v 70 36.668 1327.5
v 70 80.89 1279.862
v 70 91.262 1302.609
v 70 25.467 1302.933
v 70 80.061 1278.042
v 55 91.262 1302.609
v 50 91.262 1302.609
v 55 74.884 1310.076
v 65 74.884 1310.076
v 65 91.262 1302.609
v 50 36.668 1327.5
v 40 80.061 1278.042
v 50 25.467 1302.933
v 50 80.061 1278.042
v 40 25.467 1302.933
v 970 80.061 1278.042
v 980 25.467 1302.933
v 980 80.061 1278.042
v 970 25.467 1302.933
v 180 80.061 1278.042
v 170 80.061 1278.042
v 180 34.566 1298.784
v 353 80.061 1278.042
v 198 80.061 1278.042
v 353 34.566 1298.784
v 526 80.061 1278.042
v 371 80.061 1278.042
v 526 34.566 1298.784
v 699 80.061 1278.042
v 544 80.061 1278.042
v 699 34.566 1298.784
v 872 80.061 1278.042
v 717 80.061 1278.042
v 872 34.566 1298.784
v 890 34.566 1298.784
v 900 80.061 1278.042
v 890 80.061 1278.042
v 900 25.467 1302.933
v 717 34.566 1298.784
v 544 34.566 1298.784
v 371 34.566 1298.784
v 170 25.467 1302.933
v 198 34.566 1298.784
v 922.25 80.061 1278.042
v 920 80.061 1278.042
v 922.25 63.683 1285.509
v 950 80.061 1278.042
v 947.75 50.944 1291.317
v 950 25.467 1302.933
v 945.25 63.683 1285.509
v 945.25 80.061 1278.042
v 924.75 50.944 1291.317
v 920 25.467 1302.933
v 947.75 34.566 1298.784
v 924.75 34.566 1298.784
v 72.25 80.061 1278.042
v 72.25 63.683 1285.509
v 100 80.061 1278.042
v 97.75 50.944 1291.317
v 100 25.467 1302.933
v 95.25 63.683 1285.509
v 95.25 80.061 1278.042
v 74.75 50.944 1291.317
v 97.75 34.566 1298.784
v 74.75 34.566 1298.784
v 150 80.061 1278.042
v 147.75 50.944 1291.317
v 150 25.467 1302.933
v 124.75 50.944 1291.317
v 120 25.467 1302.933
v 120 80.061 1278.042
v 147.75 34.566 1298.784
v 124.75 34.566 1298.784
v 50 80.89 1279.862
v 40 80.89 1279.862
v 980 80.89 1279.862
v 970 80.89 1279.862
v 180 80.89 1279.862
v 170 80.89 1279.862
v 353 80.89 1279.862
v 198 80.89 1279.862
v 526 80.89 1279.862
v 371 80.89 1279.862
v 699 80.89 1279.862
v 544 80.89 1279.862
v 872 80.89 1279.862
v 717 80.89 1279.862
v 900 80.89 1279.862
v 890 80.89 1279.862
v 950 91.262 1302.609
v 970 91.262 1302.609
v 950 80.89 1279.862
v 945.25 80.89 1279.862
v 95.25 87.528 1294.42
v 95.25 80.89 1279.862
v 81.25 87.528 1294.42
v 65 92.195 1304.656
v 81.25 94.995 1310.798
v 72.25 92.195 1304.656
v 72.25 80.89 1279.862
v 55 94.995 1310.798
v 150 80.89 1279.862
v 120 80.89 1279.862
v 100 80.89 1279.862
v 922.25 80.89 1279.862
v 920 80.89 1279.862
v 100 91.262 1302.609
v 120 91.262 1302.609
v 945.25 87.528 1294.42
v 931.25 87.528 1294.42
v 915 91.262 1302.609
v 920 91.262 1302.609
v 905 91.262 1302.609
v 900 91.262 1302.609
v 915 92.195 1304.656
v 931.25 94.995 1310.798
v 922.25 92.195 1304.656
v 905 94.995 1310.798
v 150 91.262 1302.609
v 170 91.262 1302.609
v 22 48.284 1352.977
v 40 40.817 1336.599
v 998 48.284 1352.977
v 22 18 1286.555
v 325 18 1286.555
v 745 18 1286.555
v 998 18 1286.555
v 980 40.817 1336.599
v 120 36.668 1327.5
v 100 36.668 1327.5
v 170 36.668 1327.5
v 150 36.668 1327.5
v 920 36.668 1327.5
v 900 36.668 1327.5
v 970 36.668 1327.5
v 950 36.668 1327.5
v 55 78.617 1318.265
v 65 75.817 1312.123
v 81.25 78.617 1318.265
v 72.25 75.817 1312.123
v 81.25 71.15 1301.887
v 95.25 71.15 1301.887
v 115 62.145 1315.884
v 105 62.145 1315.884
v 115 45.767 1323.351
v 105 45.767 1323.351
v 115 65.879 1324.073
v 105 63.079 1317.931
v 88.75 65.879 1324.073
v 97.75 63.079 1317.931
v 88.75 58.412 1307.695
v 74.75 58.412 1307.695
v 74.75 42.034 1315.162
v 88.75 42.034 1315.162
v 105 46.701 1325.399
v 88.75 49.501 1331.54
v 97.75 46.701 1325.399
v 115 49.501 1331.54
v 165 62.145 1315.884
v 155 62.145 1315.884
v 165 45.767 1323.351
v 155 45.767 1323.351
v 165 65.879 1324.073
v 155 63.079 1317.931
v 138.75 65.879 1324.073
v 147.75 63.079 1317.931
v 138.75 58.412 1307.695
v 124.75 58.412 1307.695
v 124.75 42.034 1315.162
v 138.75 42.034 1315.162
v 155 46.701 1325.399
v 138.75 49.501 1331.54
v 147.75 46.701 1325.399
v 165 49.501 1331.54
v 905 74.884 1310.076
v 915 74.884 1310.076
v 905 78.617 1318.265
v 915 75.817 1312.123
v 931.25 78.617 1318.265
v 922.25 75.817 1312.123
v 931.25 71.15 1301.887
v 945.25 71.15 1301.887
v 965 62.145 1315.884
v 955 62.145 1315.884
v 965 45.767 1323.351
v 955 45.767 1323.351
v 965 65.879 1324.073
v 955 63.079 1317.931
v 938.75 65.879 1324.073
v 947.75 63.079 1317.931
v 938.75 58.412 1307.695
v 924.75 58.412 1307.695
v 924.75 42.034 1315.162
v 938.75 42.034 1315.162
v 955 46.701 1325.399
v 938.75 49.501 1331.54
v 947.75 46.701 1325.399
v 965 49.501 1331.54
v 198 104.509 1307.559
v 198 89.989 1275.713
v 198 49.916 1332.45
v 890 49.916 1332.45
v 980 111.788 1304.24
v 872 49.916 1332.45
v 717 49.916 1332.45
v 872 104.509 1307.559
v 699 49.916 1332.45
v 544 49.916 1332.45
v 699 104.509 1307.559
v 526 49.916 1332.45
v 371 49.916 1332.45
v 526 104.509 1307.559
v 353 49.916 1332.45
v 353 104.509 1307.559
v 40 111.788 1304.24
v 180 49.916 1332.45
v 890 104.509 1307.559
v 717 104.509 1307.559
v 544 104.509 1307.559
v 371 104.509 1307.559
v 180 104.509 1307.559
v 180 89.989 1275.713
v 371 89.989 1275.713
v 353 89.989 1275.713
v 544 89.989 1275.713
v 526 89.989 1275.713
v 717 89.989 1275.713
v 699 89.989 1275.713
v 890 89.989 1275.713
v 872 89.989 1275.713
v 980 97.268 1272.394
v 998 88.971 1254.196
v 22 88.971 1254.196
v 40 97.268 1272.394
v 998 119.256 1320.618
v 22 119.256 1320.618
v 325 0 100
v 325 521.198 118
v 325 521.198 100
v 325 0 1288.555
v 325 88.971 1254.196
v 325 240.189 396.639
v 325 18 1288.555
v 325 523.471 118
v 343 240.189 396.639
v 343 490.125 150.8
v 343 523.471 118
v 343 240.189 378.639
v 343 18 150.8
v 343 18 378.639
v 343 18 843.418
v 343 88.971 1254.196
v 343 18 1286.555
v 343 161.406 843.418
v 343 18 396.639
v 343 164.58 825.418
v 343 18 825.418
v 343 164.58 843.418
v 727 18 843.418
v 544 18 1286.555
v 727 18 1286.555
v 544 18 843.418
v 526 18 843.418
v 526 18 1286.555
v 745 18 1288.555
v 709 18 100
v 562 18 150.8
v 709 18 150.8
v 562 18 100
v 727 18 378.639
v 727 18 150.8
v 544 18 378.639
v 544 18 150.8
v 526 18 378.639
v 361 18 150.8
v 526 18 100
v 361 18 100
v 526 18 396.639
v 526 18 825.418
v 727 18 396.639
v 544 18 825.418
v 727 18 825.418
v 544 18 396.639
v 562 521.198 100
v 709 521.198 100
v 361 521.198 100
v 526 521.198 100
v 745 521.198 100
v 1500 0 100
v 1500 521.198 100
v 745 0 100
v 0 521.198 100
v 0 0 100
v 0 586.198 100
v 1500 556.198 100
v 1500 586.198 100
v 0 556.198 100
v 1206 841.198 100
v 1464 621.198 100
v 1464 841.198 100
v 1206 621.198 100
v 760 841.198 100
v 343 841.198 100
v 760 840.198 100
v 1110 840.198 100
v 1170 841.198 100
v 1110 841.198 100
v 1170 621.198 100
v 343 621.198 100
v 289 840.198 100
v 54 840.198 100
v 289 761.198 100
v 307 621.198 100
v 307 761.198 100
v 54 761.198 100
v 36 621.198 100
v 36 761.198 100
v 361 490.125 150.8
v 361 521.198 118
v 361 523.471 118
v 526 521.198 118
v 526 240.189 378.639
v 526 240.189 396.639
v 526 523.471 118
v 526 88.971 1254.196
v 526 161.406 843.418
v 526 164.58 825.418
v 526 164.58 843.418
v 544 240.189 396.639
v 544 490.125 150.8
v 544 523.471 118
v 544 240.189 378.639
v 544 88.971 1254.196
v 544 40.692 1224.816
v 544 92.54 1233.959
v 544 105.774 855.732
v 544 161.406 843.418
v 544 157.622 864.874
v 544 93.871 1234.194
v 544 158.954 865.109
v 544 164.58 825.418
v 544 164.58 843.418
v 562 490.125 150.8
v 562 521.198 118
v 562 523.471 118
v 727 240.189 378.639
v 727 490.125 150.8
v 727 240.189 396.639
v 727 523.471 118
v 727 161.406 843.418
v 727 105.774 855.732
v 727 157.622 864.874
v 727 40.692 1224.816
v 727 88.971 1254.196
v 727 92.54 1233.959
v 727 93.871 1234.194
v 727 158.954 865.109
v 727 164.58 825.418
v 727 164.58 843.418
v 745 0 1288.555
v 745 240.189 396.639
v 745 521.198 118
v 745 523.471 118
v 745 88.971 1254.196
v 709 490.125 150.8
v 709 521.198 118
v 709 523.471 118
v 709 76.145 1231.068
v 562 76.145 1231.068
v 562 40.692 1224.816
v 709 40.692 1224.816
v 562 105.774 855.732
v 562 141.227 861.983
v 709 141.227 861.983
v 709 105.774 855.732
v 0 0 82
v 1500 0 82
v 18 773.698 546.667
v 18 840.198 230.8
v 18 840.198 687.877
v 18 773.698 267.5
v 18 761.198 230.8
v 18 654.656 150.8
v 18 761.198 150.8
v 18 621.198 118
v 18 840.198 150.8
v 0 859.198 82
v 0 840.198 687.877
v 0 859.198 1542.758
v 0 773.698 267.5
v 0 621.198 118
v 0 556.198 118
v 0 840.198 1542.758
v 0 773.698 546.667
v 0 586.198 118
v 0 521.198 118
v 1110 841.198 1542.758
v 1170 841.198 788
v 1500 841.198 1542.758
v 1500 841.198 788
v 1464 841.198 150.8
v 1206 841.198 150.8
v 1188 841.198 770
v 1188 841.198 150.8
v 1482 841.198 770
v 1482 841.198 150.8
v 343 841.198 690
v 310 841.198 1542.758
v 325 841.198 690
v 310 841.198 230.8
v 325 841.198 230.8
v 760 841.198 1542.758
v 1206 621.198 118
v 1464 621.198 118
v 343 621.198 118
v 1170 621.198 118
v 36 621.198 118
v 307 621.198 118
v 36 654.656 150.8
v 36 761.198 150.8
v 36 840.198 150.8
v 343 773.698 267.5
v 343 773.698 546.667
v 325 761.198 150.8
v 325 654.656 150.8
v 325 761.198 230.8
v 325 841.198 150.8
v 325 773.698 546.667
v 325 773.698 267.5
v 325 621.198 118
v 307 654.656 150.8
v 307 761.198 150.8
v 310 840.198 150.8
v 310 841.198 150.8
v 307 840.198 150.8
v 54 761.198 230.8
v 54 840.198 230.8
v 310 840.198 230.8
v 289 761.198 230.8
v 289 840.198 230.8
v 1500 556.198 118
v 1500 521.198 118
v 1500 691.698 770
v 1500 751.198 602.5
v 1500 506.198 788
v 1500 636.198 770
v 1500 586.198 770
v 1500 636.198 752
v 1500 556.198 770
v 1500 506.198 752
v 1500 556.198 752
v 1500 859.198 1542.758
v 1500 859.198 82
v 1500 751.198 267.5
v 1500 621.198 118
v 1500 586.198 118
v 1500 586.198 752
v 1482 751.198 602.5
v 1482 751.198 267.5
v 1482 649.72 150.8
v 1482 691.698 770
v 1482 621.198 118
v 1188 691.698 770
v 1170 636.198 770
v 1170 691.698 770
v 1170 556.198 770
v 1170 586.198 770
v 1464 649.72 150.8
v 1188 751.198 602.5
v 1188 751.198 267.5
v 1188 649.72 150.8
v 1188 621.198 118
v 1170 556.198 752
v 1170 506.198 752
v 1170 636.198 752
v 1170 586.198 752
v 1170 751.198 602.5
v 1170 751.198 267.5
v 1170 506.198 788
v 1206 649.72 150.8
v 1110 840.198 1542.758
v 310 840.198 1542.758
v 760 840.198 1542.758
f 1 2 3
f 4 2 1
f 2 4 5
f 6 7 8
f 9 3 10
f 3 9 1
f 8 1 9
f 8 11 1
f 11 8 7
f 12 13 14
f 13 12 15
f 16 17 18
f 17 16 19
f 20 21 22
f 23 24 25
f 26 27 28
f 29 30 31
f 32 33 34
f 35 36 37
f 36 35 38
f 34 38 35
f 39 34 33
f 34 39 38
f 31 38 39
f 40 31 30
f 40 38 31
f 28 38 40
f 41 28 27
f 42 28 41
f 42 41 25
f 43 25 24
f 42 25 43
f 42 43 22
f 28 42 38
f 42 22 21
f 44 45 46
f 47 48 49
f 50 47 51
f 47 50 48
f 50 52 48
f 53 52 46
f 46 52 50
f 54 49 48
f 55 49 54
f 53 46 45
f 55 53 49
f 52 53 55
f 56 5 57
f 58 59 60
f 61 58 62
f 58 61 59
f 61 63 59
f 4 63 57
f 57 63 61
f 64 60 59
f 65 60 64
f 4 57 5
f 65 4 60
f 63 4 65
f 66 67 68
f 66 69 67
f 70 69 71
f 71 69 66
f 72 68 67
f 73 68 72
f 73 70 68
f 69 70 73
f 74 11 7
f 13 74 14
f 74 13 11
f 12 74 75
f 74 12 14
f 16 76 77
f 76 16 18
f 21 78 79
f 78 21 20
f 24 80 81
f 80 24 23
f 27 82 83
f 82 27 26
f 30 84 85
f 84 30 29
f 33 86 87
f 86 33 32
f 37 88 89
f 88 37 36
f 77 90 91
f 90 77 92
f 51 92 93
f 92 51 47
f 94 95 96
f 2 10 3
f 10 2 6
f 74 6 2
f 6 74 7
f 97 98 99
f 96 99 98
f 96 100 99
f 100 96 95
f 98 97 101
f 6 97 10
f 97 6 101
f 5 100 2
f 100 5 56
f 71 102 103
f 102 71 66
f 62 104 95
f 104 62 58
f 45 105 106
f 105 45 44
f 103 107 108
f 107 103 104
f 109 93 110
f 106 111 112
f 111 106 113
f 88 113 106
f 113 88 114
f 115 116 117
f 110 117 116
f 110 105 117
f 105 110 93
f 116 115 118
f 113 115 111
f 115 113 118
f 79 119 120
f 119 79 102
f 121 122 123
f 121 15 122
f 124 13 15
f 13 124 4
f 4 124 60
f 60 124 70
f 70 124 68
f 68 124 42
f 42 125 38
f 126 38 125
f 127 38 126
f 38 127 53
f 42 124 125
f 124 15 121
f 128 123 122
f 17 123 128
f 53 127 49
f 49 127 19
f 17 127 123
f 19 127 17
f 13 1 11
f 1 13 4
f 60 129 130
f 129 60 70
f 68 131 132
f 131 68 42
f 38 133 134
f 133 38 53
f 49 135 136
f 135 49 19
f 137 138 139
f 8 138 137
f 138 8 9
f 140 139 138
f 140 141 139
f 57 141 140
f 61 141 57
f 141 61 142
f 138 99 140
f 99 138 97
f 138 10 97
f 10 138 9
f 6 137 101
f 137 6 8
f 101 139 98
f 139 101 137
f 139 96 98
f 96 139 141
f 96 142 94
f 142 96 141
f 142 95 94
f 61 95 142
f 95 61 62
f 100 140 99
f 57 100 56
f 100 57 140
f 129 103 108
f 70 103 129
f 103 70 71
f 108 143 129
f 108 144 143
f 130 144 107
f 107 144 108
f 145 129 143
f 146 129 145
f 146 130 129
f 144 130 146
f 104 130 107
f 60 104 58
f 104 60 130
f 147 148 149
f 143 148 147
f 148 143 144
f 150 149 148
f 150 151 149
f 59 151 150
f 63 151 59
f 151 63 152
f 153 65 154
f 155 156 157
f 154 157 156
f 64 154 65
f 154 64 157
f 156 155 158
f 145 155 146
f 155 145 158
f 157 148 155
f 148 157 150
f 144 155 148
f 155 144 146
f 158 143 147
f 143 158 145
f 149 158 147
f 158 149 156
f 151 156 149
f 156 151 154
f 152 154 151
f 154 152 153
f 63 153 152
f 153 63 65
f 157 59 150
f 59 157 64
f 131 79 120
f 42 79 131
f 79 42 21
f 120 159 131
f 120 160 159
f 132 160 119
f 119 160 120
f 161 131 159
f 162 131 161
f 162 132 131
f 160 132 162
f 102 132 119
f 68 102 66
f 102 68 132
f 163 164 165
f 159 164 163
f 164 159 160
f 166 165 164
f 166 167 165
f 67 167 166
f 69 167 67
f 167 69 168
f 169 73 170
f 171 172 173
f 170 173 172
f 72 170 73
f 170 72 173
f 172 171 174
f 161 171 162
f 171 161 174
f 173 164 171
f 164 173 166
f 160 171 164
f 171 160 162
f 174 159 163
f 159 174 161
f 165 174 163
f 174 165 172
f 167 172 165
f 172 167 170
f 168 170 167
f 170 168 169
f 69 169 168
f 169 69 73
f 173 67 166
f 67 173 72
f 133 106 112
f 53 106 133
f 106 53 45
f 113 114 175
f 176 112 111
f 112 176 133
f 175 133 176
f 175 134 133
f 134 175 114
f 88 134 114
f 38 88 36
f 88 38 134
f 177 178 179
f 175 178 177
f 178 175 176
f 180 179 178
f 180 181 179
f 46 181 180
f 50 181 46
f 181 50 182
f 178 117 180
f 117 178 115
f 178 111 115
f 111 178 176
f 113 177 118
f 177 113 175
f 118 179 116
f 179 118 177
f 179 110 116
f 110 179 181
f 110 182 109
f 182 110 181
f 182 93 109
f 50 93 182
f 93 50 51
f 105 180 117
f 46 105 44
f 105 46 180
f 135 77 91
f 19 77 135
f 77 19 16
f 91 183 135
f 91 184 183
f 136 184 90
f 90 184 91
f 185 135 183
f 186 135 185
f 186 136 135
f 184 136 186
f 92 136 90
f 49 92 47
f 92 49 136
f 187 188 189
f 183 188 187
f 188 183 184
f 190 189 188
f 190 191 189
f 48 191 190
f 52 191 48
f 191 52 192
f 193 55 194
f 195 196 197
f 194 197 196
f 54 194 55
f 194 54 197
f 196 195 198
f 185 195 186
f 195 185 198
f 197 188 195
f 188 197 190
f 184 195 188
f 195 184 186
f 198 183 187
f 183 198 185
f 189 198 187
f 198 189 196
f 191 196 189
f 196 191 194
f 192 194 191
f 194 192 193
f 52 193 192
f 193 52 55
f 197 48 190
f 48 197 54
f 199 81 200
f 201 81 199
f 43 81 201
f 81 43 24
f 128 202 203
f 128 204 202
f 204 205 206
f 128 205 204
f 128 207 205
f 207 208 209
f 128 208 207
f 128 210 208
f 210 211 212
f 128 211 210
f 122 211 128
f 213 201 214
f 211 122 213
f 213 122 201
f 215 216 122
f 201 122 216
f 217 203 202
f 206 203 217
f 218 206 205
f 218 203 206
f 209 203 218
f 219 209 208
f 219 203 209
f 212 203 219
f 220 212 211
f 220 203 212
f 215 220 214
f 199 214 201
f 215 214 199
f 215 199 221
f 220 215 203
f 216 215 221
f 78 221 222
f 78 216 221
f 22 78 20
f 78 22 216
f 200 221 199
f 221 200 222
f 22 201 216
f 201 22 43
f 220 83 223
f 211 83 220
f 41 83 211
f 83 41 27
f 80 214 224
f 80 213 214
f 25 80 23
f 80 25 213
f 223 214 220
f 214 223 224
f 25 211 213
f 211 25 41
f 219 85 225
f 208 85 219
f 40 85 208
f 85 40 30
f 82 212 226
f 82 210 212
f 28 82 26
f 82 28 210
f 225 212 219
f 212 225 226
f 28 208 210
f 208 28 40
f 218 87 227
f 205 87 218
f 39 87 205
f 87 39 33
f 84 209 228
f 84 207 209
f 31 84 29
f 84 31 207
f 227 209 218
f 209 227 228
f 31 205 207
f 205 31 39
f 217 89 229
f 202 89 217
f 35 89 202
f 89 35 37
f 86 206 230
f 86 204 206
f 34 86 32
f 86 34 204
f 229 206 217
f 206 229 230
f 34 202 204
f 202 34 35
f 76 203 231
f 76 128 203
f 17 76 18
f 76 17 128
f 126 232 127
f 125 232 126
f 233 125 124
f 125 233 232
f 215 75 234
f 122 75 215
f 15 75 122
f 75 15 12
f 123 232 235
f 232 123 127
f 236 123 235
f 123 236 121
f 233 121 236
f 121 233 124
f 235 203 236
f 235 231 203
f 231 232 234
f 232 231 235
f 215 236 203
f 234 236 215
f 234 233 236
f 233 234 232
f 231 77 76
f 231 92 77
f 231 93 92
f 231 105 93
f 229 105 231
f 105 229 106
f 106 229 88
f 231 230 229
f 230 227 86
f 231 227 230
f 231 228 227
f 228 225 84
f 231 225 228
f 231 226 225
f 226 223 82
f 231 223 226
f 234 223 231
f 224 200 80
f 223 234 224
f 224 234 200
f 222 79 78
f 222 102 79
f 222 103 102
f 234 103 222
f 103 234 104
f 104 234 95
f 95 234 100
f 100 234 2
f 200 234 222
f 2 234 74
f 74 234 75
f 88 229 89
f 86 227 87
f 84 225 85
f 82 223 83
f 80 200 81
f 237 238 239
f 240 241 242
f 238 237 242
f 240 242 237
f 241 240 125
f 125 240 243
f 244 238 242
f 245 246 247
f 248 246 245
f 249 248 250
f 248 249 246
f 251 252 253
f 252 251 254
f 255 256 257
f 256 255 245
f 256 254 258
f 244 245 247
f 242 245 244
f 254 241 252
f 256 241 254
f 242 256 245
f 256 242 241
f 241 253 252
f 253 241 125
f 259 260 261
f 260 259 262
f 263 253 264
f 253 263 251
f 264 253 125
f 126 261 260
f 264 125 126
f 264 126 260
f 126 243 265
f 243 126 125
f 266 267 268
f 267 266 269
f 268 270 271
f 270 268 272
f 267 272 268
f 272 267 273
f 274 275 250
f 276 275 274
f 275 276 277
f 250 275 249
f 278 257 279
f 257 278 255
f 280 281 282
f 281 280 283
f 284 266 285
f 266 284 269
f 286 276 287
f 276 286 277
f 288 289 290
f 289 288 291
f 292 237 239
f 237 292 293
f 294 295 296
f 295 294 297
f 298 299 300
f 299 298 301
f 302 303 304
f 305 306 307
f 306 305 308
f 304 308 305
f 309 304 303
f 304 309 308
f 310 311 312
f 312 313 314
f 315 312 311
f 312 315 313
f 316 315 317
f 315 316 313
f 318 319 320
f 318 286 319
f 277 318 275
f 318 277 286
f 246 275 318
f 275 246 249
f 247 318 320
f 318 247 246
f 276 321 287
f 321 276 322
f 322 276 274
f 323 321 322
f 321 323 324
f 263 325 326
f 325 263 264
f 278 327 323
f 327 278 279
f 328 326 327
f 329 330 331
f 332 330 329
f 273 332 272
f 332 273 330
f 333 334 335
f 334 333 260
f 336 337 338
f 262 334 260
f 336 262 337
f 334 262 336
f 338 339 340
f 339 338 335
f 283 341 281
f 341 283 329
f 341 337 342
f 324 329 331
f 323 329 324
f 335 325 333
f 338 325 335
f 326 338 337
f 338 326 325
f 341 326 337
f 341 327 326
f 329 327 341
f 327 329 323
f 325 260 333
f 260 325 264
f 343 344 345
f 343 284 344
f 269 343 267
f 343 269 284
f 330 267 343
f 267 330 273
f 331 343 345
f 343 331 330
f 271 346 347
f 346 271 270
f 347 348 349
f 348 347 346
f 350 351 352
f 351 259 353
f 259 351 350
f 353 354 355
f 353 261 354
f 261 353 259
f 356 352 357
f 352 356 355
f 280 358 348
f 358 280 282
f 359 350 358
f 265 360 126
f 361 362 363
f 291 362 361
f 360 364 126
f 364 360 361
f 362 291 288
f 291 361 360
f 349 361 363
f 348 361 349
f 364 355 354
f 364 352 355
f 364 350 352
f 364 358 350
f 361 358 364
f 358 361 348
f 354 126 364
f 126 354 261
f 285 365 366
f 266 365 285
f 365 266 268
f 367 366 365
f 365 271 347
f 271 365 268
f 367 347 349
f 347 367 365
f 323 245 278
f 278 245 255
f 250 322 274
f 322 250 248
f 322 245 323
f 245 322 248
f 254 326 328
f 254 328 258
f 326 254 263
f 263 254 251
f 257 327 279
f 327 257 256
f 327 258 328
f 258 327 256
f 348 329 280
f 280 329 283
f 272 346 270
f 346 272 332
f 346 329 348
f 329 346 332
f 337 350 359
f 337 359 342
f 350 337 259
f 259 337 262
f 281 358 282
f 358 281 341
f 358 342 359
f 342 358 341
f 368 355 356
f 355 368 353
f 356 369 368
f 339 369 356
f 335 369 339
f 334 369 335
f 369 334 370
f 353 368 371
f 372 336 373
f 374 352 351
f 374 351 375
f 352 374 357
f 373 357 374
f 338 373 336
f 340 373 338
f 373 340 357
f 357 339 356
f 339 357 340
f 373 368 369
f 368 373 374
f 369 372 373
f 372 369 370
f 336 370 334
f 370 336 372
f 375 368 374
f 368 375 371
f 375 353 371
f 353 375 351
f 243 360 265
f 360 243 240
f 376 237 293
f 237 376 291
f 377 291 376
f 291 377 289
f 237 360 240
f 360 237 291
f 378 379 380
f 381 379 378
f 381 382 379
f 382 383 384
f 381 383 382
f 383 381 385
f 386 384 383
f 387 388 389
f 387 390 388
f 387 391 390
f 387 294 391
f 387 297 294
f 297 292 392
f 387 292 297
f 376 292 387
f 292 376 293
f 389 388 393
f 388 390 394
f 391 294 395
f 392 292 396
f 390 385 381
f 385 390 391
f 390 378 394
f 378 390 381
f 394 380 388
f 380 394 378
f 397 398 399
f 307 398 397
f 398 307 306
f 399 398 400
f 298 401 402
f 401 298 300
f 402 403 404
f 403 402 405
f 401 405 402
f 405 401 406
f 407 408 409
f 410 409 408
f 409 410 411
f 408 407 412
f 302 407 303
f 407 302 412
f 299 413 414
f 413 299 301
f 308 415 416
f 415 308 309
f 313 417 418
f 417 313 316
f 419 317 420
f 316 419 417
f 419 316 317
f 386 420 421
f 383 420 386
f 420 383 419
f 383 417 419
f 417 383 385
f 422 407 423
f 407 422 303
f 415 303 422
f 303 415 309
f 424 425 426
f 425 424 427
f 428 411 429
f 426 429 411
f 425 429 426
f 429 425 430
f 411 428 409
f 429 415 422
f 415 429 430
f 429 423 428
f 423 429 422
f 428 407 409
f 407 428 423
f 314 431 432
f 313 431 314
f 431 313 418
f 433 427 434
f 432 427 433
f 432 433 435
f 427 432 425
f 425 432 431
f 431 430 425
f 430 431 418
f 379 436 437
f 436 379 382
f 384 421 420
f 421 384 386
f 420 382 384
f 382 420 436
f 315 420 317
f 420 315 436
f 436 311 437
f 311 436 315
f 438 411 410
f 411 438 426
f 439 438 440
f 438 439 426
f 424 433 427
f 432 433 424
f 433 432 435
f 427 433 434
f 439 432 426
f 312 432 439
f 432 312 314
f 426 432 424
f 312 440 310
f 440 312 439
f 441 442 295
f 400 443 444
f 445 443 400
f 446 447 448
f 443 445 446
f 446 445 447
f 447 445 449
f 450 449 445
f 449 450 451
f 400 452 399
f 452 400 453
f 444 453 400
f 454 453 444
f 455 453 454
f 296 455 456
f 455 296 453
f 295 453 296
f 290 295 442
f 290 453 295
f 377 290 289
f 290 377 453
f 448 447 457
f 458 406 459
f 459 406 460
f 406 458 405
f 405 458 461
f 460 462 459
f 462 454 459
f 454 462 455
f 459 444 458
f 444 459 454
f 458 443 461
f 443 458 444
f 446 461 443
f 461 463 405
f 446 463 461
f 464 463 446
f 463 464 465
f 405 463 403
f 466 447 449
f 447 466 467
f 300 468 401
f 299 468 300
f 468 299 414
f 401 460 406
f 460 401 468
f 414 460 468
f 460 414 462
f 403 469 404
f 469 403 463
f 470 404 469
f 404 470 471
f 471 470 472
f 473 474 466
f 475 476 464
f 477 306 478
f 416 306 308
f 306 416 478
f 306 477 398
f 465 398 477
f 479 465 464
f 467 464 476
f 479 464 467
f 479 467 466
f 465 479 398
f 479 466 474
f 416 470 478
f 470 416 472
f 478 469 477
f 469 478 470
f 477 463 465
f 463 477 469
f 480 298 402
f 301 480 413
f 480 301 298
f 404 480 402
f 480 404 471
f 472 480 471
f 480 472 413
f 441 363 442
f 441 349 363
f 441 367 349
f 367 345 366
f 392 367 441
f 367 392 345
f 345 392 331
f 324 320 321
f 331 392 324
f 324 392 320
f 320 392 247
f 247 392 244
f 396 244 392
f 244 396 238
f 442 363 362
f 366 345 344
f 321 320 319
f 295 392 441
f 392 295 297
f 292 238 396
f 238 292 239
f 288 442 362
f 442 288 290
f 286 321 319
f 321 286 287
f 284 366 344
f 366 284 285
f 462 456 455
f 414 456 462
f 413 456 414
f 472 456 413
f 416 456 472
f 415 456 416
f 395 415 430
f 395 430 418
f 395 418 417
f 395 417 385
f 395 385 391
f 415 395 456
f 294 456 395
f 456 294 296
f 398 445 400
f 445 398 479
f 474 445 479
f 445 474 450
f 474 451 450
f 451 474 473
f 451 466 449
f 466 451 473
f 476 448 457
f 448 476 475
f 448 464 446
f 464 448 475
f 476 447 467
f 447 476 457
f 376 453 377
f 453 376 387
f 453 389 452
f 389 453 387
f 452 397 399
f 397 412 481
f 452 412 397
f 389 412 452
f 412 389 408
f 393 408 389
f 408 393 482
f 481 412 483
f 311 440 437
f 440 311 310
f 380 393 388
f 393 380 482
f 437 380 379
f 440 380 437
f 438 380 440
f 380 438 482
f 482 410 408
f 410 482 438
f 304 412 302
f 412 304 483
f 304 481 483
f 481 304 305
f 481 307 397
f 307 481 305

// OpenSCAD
// file: params.scad
sheet_thickness=18;				// thickness of the plywood sheet.

laser_width=20;					// width of the laser
laser_height=27;				// height of the laser
laser_origin_height=16;			// center of the laser beam
laser_length=60;				// length of the laser (includes cable allowance).
laser_spread_angle = 2*atan((110/2)/60);	// angle the laser spreads out from origin.

laser_setback        =  48.45*10;	// how much the laser is set back from the center of the bike.
laser_position_z     = 119.26*10;	// height of the laser center.
laser_position_angle =  24.51;		// angle the laser points down.

laser_low = 50;
laser_high=1350;

laser_y = laser_length;

wheel_width=30;					// maximum width of a wheel
wheel_height=670;				// height of a 700CC wheel.

handlebar_width_max = 500;
channel_offset = handlebar_width_max / 2 + 20;
channel_thickness = 50;

base_length=1500;

hb_85=50+laser_width/2;			// position of handlebar 85cm line (centered on laser)
hb_80=hb_85+50;					// position of handlebar 80cm line
hb_75=hb_80+50;					// position of handlebar 75cm line

bb_0=hb_75+750;					// position of bottom bracket line
bb_5=bb_0+50;					// position of bottom bracket +5cm line

// castor dimensions.
castor_height = 82;
castor_radius = 80;
castor_plate = 36;

// bottom of the jig from the floor.
base_bottom = sheet_thickness + castor_height;

tab_height = 2*25.4;	// Height of the tabs to attach the column and back.

// utility functions.

function rotate_point(p,a) = [p[0]*cos(a) - p[1]*sin(a), p[0]*sin(a) + p[1]*cos(a)];

// output the sheet thickness so export.py knows how to created the files.
echo( sheet_thickness=sheet_thickness );
// file: lasers.scad
include <params.scad>

show_laser_lines = 0;

laser_clearance = 10;   // Clearance around the laser modules.
lasers_x = hb_85-laser_width/2-laser_clearance-sheet_thickness;
lasers_margin = laser_width/2+laser_clearance+sheet_thickness;
lasers_length = (bb_5-hb_85)+2*lasers_margin;
lasers_height = sheet_thickness*2 + laser_height + laser_clearance;
lasers_width = laser_length+sheet_thickness;

lasers_back_yz = rotate_point( [-laser_length, -laser_origin_height-sheet_thickness],
                    -laser_position_angle );
lasers_front_yz = rotate_point( [sheet_thickness, -laser_origin_height-sheet_thickness],
                    -laser_position_angle );
                    
lasers_effective_width = abs(lasers_back_yz[0]-lasers_front_yz[0]);

base_width =
    sheet_thickness +
    abs(lasers_back_yz[0]) + laser_setback +
    channel_offset +
    sheet_thickness;
 
back_height_over = 5;
back_height=(laser_setback + channel_offset) * tan(laser_spread_angle/2 - laser_position_angle) + laser_position_z + back_height_over;
    
channel_center = base_width - sheet_thickness + channel_offset;

module laser_clamp( p, back ) {
    laser_clearance = 10;
    clamp_thickness = laser_clearance - 1;
    foot_length = 14 + clamp_thickness;
    border = 2.25;
    pad = 10;
    overlap = 0.25;
    
    laser_clamp_points = [
        [0,0],
        [foot_length, 0],
        [foot_length, laser_height + border],
        [foot_length + border + laser_width/2 - pad/2, laser_height + border],
        [foot_length + border + laser_width/2 - pad/2, laser_height - overlap],
        [foot_length + border + laser_width/2 + pad/2, laser_height - overlap],
        [foot_length + border + laser_width/2 + pad/2, laser_height + clamp_thickness],
        [foot_length - border - clamp_thickness + border, laser_height + clamp_thickness],
        [foot_length - border - clamp_thickness + border, sheet_thickness],    
        [0, sheet_thickness],    
    ];
    echo( laser_clamp_points=laser_clamp_points );
    pad_middle = laser_clamp_points[5][0] - pad/2;
    
    translate( p ) {
        color( [.9,.9,0] )
        if( back ) {
            translate( [0,10,0] )
            translate( [-pad_middle,sheet_thickness,0] )
            rotate( [90,0,0] )
            linear_extrude( height=sheet_thickness )
            polygon( laser_clamp_points );
        }
        else {
            translate( [laser_clamp_points[3][0]+laser_width/2-pad/2,laser_length-sheet_thickness,0] )
            rotate( [90,0,180] )
            linear_extrude( height=sheet_thickness )
            polygon( laser_clamp_points );
        }
    }
}

module lasers() {
    translate( [lasers_x, sheet_thickness+abs(lasers_back_yz[0]), base_bottom+laser_position_z] )
    rotate( [-laser_position_angle, 0, 0] )
    translate( [0,-(lasers_width-sheet_thickness),-(laser_origin_height+sheet_thickness)] ) {
        // Draw the laser modules and clamps.
        laser_start = sheet_thickness+laser_clearance;
        laser = [laser_width, laser_length, laser_height];
        translate( [laser_start, 0, sheet_thickness] ) {
            lps = [hb_85-hb_85, hb_80-hb_85, hb_75-hb_85, bb_0-hb_85, bb_5-hb_85];
            for( lp = lps ) {
                translate( [lp, 0, 0] )
                color( [1,.5,0] )
                cube( laser );
                
                laser_clamp( [lp+laser_width/2, 0, 0], lp==lps[1] || lp==lps[2] || lp==lps[4] );
            }
        }
        
        color( [.9,.9,.9] ) {
            //------------------------------------------
            lasers_bottom = [lasers_length-sheet_thickness*2, laser_length, sheet_thickness];
            echo( lasers_bottom=lasers_bottom );
            
            translate( [sheet_thickness, 0, 0] )
            cube( lasers_bottom );
            
            //------------------------------------------
            lasers_top = [lasers_length, lasers_width, sheet_thickness];
            echo( lasers_top=lasers_top );
            
            translate( [0, 0, lasers_height-sheet_thickness] )
            cube( lasers_top );
            
            //------------------------------------------
            lip = 2;
            lasers_front = [lasers_length-sheet_thickness*2, sheet_thickness, sheet_thickness+lip];
            echo( lasers_front=lasers_front );

            translate( [sheet_thickness, lasers_width-sheet_thickness, 0] )
            cube( lasers_front );
            
            //------------------------------------------
            lasers_end = [sheet_thickness, lasers_width, lasers_height-sheet_thickness];
            echo( "2x", lasers_end=lasers_end );
            
            translate( [0,0,0] )
            cube( lasers_end );
            translate( [lasers_length-sheet_thickness,0,0] )
            cube( lasers_end );
 
            //------------------------------------------
            lasers_spacer = [sheet_thickness, lasers_width-sheet_thickness, lasers_height-sheet_thickness*2];
            echo( "5x", lasers_spacer=lasers_spacer );
            
            spacer_start = lasers_margin + (hb_75 - hb_85) + laser_width/2 + laser_clearance;
            spacer_end = lasers_length - lasers_margin - (bb_5-bb_0) - laser_width/2 - laser_clearance - sheet_thickness;
            spacer_inc = (spacer_end - spacer_start) / 4;
            echo( lasers_length=lasers_length, spacer_start=spacer_start, spacer_end=spacer_end, spacer_inc=spacer_inc );
            for (i = [0:4]) {
                translate( [spacer_start + i * spacer_inc,laser_clearance,sheet_thickness] )
                cube( lasers_spacer );
            }
        }
    }
}

module laser_lines() {
	a = laser_spread_angle/2+laser_position_angle;
	base_intersect = laser_position_z / tan( a );
	points = [
		[0,0],
		[-laser_position_z, base_intersect],
		[-laser_position_z, laser_setback + channel_offset],
		[back_height-laser_position_z-back_height_over, laser_setback + channel_offset],
	];
    y = base_width - sheet_thickness - channel_offset - laser_setback;  
    x = lasers_x+sheet_thickness+laser_clearance+laser_width/2;
	color( [0,1,0,.05] ) {
        translate( [x, y, laser_position_z + base_bottom] )
		for( lp = [hb_85-hb_85, hb_80-hb_85, hb_75-hb_85, bb_0-hb_85, bb_5-hb_85] ) {
			translate( [lp, 0, 0] )
			rotate( a=[0,270,0] )
			linear_extrude( height=1 )
			polygon( points );
		}
	}
}

lasers();
if( show_laser_lines ) {
	laser_lines();
}
// file: column.scad
include <lasers.scad>

laser_reveal = 165;
column_width = bb_0 - hb_75 - laser_reveal * 2;
column_height = laser_position_z+lasers_back_yz[1];

column_x = (bb_0+hb_75-column_width)/2;

module column() {
    translate( [0, 0, base_bottom] ) {
        // Add a lip on the column front for alignment.
        column_front = [column_width, sheet_thickness, column_height+2];
        
        echo( column_front=column_front );
        
        echo( column_x=column_x );
        translate( [column_x,0,0] )
        cube( column_front );
        
        column_laser_x = laser_reveal + hb_75-hb_85 + laser_clearance + sheet_thickness;
        echo( column_laser_x=column_laser_x );
        
        column_support_break_y = (lasers_effective_width + laser_setback)/2.5;
        column_support_break_z = .25*column_height;
        column_support_z2 = column_height-abs(lasers_back_yz[1]-lasers_front_yz[1]);
        column_support = [
            [0,0],
            [0,column_height],
            [lasers_effective_width,column_support_z2],
            [column_support_break_y,column_support_break_z],
            [lasers_effective_width + laser_setback-channel_thickness,sheet_thickness],
            [lasers_effective_width + laser_setback-channel_thickness,0]
        ];
        echo( "3x", column_support=column_support );
        
        // Compute the tabs to attach the supports to the base.
        x_max = column_support[len(column_support)-1][0];
        y_tab = column_support[len(column_support)-3][1] - sheet_thickness;
        x_tab = x_max - column_support[len(column_support)-3][0];
        a_tab = atan( y_tab / x_tab );
        
        col_suppport_tab = [
            [0,0],
            [0,tab_height],
            [x_max - (tab_height - sheet_thickness)/tan(a_tab),tab_height],
            [x_max,sheet_thickness],
            [x_max,0],
        ];
        echo( "3x", col_suppport_tab=col_suppport_tab );
        
        column_support_spacing = (column_width - sheet_thickness) / 2;
        translate( [column_x, sheet_thickness, 0] ) {
            for( i = [0:2] ) {
                translate([i*column_support_spacing,0,0])
                rotate([90,0,90])
                linear_extrude(height=sheet_thickness)
                polygon(points=column_support);

                translate([i*column_support_spacing+(i==2?-sheet_thickness:sheet_thickness),0,0])
                rotate([90,0,90])
                linear_extrude(height=sheet_thickness)
                polygon(points=col_suppport_tab);
            }
        }
        
        column_support_brace_1 = [
            (column_width - 3*sheet_thickness)/2,
            column_support_break_y,
            sheet_thickness
        ];
        column_support_brace_2 = [
            (column_width - 3*sheet_thickness)/2,
            (column_support_break_y+lasers_effective_width)/2,
            sheet_thickness
        ];
        echo( "2x", column_support_brace_1=column_support_brace_1 );
        echo( "2x", column_support_brace_2=column_support_brace_2 );
        
        column_support_brace_height_1 = column_support_break_z-sheet_thickness;
        column_support_brace_height_2 = (column_support_z2+column_support_break_z)/2;
        echo( column_support_brace_height_1=column_support_brace_height_1,
            column_support_brace_height_2=column_support_brace_height_2 );
        
        color( [1,0,0,.2] )
        translate( [column_x, 0, 0] )
        for ( x = [sheet_thickness, (column_width+sheet_thickness)/2] ) {
            translate( [x, sheet_thickness, column_support_brace_height_1] )
            cube( column_support_brace_1 );

            translate( [x, sheet_thickness, column_support_brace_height_2] )
            cube( column_support_brace_2 );            
        }
        
        //----------------------------------------------------
        // Electronics box.
        //
        electronics_cover = [
            (column_width - 3*sheet_thickness)/2,
            sheet_thickness,
            (column_support_z2 - column_support_break_z)/2 - sheet_thickness*3,
        ];
        echo( electronics_cover=electronics_cover );
       
        electronics_cover_block = [
            sheet_thickness,
            sheet_thickness*2,
            electronics_cover[2]
        ];
        echo( "2x", electronics_cover_block=electronics_cover_block );
        
        // Draw the cover (pain!).
        xy0 = column_support[2];
        xy1 = column_support[3];
        x = xy1[0] - xy0[0];
        y = xy1[1] - xy0[1];
        a = atan( x/y );
        
        color( [0,1,1] )
        translate( [column_x + sheet_thickness*2 + electronics_cover[0], 0, xy0[1]] )
        rotate( [-a,0,0] ) {
            translate( [0, lasers_effective_width, -electronics_cover[2]-sheet_thickness*2] )
            cube( electronics_cover );
            
            translate( [0, lasers_effective_width - electronics_cover_block[1], -electronics_cover[2]-sheet_thickness*2] )
            cube( electronics_cover_block );
            
            translate( [electronics_cover[0]-sheet_thickness, lasers_effective_width - electronics_cover_block[1], -electronics_cover[2]-sheet_thickness*2] )
            cube( electronics_cover_block );
        }
    }
}

color( [1,1,1] )
column();
// main file
include <column.scad>

clamp_width = 330;

module wheel( x, y, z ) {
    translate([x,y,z])
    rotate([0,90,90])
    cylinder(h=wheel_width, d=wheel_height, center="true");
}

module body() {
    // base
    base_cube = [base_length, base_width, sheet_thickness];
    echo( base_cube=base_cube );
        
    color( [1,0,0] )
    translate( [0,0,base_bottom-sheet_thickness] )
    cube( base_cube );
    
    // back
    back_cube = [base_length, sheet_thickness, back_height];
    
    // Split the back in half horizontally so both parts can be cut from a 4x8 sheet.
    back_1 = [back_cube[0], back_cube[1], back_cube[2]*0.75];
    echo( back_1=back_1 );
    
    back_2 = [back_cube[0], back_cube[1], back_cube[2]*0.25];
    echo( back_2=back_2 );
    
    color( [1,1,1] )
    translate( [0,base_width-sheet_thickness,base_bottom] )
    cube( back_cube );
    
    // back braces
    // hb braces
    back_brace_hb_thickness = channel_offset/4;
    back_brace_hb_y1 = wheel_height*2/3;
    back_brace_hb_y2 = wheel_height*1/4;
    back_brace_hb = [
        [0,0],
        [0,wheel_height-100+20],
        [back_brace_hb_thickness,back_brace_hb_y1],
        [back_brace_hb_thickness,back_brace_hb_y2],
        [channel_offset-channel_thickness, sheet_thickness],
        [channel_offset-channel_thickness, 0],
    ];
    echo( "2x", back_brace_hb=back_brace_hb );

    x_max_hb = back_brace_hb[len(back_brace_hb)-1][0];
    y_tab_hb = back_brace_hb[len(back_brace_hb)-3][1] - sheet_thickness;
    x_tab_hb = x_max_hb - back_brace_hb[len(back_brace_hb)-3][0];
    a_tab_hb = atan( y_tab_hb / x_tab_hb );
    back_brace_hb_tab = [
        [0,0],
        [0,tab_height],
        [channel_offset-channel_thickness - (tab_height - sheet_thickness)/tan(a_tab_hb), tab_height],
        [channel_offset-channel_thickness, sheet_thickness],
        [channel_offset-channel_thickness, 0],
    ];
    echo( "2x", back_brace_hb_tab=back_brace_hb_tab );
    
    color( [1,1,1] ) {
        for( x = [0, column_x] ) {
            translate([x+sheet_thickness,
                base_width-sheet_thickness,
                base_bottom])
            rotate([90,0,-90])
            linear_extrude( height=sheet_thickness )
            polygon( points=back_brace_hb );
            
            translate([x+(x==0?+sheet_thickness*2:0),
                base_width-sheet_thickness,
                base_bottom])
            rotate([90,0,-90])
            linear_extrude( height=sheet_thickness )
            polygon( points=back_brace_hb_tab );
        }
    }
    
    // hb braces struts.
    back_stiffener_thickness = 80;
    hb_brace_pad = [
        sheet_thickness,
        back_stiffener_thickness,
        back_stiffener_thickness
    ];
    echo( "2x", hb_brace_pad=hb_brace_pad );
    hb_brace_strut = [
        sheet_thickness,
        back_stiffener_thickness,
        back_stiffener_thickness + tab_height,
    ];
    echo( "2x", hb_brace_strut=hb_brace_strut );
    
    color( [1,0,0] ) {
        translate( [sheet_thickness, base_width-sheet_thickness-back_stiffener_thickness,
        base_bottom+tab_height] )
        cube( hb_brace_pad );

        translate( [sheet_thickness*2, base_width-sheet_thickness-back_stiffener_thickness,
        base_bottom] )
        cube( hb_brace_strut );
        
        translate( [column_x-sheet_thickness, base_width-sheet_thickness-back_stiffener_thickness,
        base_bottom+tab_height] )
        cube( hb_brace_pad );

        translate( [column_x-sheet_thickness*2, base_width-sheet_thickness-back_stiffener_thickness,
        base_bottom] )
        cube( hb_brace_strut );

    }
    
    // bb braces
    clamp_y = base_width-sheet_thickness-channel_offset-channel_thickness - wheel_width/2;
    clamp_length = base_width-clamp_y-sheet_thickness;
    clamp_height = base_bottom + wheel_height;
    
    back_brace_bb_thickness = channel_offset/3;
    back_brace_bb = [
        [0,0],
        [0,wheel_height],
        [clamp_length/2-sheet_thickness,wheel_height],
        [back_brace_bb_thickness,wheel_height*3/4],
        [back_brace_bb_thickness,wheel_height*1/4],
        [channel_offset-channel_thickness, sheet_thickness],
        [channel_offset-channel_thickness, 0],
    ];
    echo( "2x", back_brace_bb=back_brace_bb );
    
    x_max_bb = back_brace_bb[len(back_brace_bb)-1][0];
    y_tab_bb = back_brace_bb[len(back_brace_bb)-3][1] - sheet_thickness;
    x_tab_bb = x_max_bb - back_brace_bb[len(back_brace_bb)-3][0];
    a_tab_bb = atan( y_tab_bb / x_tab_bb );
    back_brace_bb_tab = [
        [0,0],
        [0,tab_height],
        [channel_offset-channel_thickness - (tab_height - sheet_thickness)/tan(a_tab_bb), tab_height],
        [channel_offset-channel_thickness, sheet_thickness],
        [channel_offset-channel_thickness, 0],
    ];
    echo( "2x", back_brace_bb_tab=back_brace_bb_tab );
    
    color( [1,1,1] ) {
        for( x = [base_length-sheet_thickness,base_length-clamp_width] ) {
            translate([x+sheet_thickness,
                base_width-sheet_thickness,
                base_bottom])
            rotate([90,0,-90])
            linear_extrude( height=sheet_thickness )
            polygon( points=back_brace_bb );

            translate([x+(x==base_length-clamp_width?+sheet_thickness*2:0),
                base_width-sheet_thickness,
                base_bottom])
            rotate([90,0,-90])
            linear_extrude( height=sheet_thickness )
            polygon( points=back_brace_bb_tab );

        }
    }
    
    // channels.
    channel_cube = [base_length, channel_thickness-wheel_width/2, sheet_thickness];
    echo( "2x", channel_cube=channel_cube );
    
    color( [1,1,1] ) {
        translate( [0, base_width-sheet_thickness-channel_offset-channel_thickness, base_bottom] )
        cube( channel_cube );
        
        translate( [0, base_width-sheet_thickness-channel_offset+wheel_width/2, base_bottom] )
        cube( channel_cube );
    }
    
    //-------------------------------------------------------
    // back wheel clamp.
    color([0,.7,.7,1]) {
        
        //-----------------------------------
        bike_clamp_support = [clamp_width, clamp_length/2, sheet_thickness];
        echo( bike_clamp_support=bike_clamp_support );
        translate( [base_length-clamp_width, clamp_y+clamp_length/2, clamp_height] )
        cube( bike_clamp_support );
        
        //-----------------------------------
        bike_clamp = [clamp_width, clamp_length/2, sheet_thickness];
        echo( bike_clamp=bike_clamp );
        
        translate( [base_length-clamp_width, clamp_y, clamp_height] )
        cube( bike_clamp );
        
        //-----------------------------------
       bike_clamp_channel = [clamp_width, channel_thickness, sheet_thickness];
        echo( "2x", bike_clamp_channel=bike_clamp_channel );
        
        // Bike clamp channels.
        translate( [base_length-clamp_width,clamp_y,clamp_height-sheet_thickness] )
        cube( bike_clamp_channel );
        
        translate( [base_length-clamp_width,clamp_y+channel_thickness+wheel_width,clamp_height-sheet_thickness] )
        cube( bike_clamp_channel );

    };
    
    // colored indicators.
    translate( [0, base_width-sheet_thickness-1, base_bottom] )
    color( [1,0,0] )
    cube( [hb_85-0, 1, back_height] );
    
    translate( [hb_85, base_width-sheet_thickness-1, base_bottom] )
    color( [1,.75,0] )
    cube( [hb_80-hb_85, 1, back_height] );

    translate( [hb_80, base_width-sheet_thickness-1, base_bottom] )
    color( [1,1,0] )
    cube( [hb_75-hb_80, 1, back_height] );

    translate( [hb_75, base_width-sheet_thickness-1, base_bottom] )
    color( [0,1,0] )
    cube( [150, 1, back_height] );

    translate( [bb_0-150, base_width-sheet_thickness-1, base_bottom] )
    color( [1,0,0] )
    cube( [150, 1, back_height] );
    
    translate( [bb_0, base_width-sheet_thickness-1, base_bottom] )
    color( [1,1,0] )
    cube( [bb_5-bb_0, 1, back_height] );
    
    translate( [bb_5, base_width-sheet_thickness-1, base_bottom] )
    color( [0,1,0] )
    cube( [150, 1, back_height] );
}

body();

if( 0 ) {
    for( x = [wheel_height/2+base_bottom, wheel_height/2+base_bottom+1000] ) {
        wheel(
            x,
            base_width-sheet_thickness-channel_offset-wheel_width/2,
            wheel_height/2+base_bottom );
    }
}
